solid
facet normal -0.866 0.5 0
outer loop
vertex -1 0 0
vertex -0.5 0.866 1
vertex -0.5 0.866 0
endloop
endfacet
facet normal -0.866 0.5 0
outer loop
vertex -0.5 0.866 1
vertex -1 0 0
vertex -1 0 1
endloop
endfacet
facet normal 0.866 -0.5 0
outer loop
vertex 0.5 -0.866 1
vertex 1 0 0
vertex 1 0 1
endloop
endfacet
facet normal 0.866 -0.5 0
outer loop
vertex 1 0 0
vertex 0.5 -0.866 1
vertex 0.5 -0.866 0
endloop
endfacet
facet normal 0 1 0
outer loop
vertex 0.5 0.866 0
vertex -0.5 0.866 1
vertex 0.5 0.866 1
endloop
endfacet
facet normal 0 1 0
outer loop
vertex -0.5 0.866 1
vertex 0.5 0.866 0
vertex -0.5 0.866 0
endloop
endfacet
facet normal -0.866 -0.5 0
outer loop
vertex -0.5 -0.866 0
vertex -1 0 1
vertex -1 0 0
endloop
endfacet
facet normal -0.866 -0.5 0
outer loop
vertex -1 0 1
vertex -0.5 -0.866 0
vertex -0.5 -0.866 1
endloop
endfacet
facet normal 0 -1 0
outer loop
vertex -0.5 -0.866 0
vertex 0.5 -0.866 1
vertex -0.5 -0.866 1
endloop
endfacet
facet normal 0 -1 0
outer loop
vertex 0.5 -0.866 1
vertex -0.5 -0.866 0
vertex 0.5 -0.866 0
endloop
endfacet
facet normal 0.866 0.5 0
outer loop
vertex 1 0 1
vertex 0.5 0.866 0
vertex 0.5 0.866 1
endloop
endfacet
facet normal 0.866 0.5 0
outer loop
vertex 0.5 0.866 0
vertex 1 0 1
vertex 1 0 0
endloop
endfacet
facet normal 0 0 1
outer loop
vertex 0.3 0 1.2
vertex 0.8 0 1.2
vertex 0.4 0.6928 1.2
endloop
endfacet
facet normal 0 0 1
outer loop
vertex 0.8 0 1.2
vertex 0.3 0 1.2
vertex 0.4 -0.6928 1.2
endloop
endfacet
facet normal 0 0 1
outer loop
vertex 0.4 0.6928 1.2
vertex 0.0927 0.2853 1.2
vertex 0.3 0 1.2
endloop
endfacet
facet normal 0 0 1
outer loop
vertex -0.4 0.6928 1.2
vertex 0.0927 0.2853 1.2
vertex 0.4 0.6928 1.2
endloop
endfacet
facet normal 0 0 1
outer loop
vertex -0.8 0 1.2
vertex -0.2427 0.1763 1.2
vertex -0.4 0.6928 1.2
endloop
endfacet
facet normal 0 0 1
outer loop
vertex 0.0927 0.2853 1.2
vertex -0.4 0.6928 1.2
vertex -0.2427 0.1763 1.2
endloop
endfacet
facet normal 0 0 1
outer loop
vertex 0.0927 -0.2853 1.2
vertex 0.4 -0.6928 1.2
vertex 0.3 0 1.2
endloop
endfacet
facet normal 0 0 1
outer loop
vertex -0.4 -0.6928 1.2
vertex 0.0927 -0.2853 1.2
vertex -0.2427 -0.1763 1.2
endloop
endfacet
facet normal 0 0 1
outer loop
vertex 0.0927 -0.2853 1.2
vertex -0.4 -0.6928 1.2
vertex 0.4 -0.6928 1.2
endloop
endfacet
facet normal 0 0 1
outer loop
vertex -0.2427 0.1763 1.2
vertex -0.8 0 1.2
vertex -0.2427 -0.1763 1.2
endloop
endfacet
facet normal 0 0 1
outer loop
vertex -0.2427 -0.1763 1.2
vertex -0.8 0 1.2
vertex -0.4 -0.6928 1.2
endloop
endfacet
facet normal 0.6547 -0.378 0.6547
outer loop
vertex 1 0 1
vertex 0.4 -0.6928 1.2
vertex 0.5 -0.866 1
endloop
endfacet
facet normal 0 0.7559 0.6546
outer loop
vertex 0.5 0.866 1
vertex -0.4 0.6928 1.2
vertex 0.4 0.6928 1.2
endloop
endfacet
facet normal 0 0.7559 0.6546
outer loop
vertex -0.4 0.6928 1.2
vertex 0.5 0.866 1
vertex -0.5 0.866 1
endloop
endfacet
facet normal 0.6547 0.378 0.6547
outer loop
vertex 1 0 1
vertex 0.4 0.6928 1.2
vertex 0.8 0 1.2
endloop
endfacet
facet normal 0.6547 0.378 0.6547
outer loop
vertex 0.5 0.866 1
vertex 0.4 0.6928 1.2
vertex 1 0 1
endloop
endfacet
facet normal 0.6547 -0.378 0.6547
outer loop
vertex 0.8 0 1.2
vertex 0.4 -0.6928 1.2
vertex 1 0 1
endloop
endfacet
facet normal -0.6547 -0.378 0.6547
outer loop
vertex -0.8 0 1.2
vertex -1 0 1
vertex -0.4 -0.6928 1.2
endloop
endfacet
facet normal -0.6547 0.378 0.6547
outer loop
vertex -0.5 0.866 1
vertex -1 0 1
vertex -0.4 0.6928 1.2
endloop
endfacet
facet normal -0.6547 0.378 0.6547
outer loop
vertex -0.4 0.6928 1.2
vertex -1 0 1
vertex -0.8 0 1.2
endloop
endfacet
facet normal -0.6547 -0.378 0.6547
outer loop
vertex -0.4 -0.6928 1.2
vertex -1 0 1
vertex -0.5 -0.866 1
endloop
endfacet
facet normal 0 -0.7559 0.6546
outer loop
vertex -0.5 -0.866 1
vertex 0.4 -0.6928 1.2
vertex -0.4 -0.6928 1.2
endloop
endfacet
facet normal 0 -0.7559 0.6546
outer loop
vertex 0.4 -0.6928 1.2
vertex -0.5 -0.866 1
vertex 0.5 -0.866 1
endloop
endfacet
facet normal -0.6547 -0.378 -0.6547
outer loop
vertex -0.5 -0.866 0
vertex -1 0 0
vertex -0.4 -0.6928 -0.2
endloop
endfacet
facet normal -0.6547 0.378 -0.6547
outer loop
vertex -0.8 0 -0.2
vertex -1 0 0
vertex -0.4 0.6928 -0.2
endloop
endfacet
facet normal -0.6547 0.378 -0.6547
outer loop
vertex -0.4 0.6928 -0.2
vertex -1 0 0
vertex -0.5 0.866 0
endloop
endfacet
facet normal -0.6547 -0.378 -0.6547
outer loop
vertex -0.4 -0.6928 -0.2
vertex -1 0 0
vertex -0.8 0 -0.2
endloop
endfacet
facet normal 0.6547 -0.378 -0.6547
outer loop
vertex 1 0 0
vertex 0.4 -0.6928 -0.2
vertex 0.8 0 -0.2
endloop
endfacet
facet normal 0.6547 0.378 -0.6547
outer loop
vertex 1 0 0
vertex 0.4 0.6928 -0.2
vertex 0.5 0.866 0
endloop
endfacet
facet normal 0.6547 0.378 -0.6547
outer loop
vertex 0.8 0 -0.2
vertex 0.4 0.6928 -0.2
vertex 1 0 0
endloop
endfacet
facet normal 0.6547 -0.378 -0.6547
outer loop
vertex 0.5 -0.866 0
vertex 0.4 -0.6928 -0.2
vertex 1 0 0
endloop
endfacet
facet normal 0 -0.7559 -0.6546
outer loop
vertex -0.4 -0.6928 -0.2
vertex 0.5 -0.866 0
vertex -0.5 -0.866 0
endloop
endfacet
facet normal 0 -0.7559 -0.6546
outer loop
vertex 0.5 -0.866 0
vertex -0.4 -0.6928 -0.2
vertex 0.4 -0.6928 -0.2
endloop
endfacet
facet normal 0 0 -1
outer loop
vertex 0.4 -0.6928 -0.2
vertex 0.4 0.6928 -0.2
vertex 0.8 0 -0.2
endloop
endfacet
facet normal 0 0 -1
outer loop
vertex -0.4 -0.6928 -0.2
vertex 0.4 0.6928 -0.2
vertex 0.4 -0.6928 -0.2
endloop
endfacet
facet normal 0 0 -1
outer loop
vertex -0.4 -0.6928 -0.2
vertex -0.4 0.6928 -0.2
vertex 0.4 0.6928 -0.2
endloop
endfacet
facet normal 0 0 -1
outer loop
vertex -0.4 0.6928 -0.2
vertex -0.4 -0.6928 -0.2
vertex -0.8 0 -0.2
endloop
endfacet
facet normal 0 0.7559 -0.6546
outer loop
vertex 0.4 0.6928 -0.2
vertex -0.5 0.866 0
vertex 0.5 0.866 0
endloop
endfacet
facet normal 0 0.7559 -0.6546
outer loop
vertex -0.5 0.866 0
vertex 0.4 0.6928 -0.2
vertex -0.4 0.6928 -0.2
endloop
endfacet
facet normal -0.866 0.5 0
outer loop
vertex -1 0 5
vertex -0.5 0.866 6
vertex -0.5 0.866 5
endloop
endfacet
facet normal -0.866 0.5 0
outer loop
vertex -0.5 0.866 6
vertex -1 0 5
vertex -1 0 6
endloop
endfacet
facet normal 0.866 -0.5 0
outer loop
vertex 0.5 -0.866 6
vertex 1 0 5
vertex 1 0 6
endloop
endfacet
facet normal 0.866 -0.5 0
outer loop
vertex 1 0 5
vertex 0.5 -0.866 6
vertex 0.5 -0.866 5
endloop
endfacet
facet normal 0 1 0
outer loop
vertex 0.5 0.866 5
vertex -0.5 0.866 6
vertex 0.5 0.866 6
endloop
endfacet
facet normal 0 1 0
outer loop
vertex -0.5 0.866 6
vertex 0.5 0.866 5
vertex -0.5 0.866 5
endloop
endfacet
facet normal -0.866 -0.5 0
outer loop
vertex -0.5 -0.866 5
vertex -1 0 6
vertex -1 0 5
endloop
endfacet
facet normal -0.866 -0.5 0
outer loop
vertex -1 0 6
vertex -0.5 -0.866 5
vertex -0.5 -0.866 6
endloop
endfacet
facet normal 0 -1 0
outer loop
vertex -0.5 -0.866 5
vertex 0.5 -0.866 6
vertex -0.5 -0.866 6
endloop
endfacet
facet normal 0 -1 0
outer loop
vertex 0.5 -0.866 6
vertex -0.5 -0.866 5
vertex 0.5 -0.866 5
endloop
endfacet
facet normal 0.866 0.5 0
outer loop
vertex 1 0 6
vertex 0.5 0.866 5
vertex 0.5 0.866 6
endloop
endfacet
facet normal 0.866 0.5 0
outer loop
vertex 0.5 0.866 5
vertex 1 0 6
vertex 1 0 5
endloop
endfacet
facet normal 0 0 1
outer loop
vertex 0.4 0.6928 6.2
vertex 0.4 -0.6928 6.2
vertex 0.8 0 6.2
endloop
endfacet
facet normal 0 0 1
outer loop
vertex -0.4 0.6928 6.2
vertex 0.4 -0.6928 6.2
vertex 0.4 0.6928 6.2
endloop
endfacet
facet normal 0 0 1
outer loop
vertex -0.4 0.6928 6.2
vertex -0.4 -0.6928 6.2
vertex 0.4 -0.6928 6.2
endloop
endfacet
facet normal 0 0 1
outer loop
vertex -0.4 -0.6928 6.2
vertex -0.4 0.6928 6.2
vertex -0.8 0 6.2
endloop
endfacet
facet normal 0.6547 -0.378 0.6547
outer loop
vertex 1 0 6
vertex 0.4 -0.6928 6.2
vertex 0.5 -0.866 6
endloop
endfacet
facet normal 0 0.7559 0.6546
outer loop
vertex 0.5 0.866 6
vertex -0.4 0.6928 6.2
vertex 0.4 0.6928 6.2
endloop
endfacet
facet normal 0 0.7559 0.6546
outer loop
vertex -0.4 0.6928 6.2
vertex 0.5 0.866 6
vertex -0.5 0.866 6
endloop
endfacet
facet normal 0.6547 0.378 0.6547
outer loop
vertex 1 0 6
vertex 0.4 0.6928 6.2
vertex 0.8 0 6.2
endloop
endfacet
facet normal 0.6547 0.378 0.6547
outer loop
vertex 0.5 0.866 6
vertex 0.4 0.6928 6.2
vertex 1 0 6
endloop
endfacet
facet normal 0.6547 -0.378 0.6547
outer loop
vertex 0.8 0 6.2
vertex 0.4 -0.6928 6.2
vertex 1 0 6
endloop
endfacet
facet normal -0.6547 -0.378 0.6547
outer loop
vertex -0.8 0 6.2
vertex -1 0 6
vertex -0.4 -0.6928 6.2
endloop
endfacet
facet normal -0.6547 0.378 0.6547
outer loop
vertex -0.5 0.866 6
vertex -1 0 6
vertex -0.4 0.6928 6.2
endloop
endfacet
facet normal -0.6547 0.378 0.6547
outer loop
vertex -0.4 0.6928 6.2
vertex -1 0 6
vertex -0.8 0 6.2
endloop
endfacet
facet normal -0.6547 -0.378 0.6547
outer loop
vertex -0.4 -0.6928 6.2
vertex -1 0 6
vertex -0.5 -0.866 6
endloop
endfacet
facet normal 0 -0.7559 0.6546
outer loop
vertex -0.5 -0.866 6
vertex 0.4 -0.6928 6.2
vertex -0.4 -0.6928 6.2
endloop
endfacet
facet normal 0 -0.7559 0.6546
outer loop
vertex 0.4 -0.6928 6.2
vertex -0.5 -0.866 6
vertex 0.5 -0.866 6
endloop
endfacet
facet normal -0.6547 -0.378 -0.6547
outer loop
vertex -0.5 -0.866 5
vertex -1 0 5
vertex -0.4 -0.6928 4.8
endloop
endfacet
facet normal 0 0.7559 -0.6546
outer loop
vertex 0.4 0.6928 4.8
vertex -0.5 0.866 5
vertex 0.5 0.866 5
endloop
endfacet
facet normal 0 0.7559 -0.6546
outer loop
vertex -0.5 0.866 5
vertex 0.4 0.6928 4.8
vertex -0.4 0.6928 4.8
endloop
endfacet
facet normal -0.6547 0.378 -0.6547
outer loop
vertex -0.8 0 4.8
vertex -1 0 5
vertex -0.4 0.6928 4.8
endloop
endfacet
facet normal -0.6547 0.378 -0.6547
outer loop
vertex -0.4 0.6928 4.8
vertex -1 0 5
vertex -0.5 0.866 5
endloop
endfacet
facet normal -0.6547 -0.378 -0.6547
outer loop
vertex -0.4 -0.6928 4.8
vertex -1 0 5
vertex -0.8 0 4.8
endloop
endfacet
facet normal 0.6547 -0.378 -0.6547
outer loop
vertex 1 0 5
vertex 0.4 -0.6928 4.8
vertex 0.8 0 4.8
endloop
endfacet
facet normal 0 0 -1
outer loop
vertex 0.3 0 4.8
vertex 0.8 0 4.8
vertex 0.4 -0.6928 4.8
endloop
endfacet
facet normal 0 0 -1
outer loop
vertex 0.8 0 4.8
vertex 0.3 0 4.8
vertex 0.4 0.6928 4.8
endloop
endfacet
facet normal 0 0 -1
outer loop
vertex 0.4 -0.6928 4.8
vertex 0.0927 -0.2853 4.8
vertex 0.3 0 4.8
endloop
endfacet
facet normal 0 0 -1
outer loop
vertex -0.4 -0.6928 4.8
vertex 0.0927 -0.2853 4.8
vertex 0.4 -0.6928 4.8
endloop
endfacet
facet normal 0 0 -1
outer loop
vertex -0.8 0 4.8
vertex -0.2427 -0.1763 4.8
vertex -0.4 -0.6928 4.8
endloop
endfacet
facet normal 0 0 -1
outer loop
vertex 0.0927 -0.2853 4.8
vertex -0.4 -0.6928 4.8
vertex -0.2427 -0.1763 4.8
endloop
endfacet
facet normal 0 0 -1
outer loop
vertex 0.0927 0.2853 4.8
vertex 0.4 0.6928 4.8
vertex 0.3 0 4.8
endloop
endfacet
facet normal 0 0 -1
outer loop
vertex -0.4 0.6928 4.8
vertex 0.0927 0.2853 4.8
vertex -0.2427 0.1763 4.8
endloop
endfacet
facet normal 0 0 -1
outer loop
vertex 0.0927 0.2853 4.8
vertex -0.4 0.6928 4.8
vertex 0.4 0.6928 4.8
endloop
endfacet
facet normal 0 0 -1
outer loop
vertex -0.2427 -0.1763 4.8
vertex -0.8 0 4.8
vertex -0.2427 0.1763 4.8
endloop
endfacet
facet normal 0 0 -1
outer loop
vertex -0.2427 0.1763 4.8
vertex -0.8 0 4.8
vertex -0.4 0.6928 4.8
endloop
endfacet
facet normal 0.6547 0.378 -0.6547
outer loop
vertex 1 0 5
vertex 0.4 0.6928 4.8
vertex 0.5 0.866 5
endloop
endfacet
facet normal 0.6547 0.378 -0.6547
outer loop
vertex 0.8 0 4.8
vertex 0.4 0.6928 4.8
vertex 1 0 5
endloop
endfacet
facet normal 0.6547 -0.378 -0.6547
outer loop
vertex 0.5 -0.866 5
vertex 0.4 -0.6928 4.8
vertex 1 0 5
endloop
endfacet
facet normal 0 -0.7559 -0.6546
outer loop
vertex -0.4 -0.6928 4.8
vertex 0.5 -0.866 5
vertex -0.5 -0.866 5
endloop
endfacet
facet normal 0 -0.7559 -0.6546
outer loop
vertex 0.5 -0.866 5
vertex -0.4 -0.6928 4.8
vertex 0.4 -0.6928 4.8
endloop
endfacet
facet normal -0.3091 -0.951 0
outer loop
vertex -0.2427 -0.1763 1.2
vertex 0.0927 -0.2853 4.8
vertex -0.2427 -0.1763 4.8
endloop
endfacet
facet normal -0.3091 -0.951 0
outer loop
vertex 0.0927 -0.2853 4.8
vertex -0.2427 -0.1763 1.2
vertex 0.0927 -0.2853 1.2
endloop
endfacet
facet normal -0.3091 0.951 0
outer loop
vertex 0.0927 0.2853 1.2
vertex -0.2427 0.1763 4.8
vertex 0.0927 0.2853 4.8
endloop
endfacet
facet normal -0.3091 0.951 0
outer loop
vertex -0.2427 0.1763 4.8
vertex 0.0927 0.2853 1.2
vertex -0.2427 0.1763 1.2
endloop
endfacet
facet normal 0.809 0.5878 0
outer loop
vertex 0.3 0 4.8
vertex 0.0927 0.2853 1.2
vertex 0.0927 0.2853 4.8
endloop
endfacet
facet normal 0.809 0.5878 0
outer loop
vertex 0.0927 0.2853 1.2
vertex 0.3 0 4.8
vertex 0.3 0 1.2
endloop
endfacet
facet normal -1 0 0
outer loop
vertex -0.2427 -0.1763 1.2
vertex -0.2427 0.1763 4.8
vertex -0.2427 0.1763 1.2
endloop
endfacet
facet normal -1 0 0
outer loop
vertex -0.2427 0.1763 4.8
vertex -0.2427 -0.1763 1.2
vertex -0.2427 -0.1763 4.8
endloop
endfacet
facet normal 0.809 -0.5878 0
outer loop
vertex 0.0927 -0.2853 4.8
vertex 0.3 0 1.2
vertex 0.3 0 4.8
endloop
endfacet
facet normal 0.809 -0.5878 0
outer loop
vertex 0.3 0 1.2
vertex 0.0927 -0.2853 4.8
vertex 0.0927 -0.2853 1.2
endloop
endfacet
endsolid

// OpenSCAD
module Weights_01(){

    module regular_polygon(order = 6, r=1){
         angles=[ for (i = [0:order-1]) i*(360/order) ];
         coords=[ for (th=angles) [r*cos(th), r*sin(th)] ];
         polygon(coords);
    }
     
     
    module weight(){ 
    color("#a8b0b2")
    linear_extrude(height= 1)
    regular_polygon(order = 6);
     
    translate([0,0,1])
    color("#a8b0b2")
    linear_extrude(height= 0.2, scale = 0.8)
    regular_polygon(order = 6);
     
    translate([0,0,0])
    rotate([0,180,0])
    color("#a8b0b2")
    linear_extrude(height= 0.2, scale = 0.8)
    regular_polygon(order = 6);
    }
     
     weight(); 
     translate([0,0,5])
     weight();
     
     color("#3b3b3b")
     cylinder(5,0.3,0.3);
 
}
 
Weights_01();

// Written by Nicolì Angelo (Gengio) 2024: 
// MIT License

//Permission is hereby granted, free of charge, to any person obtaining a copy of this software and associated documentation files (the "Software"), to deal in the Software without restriction, including without limitation the rights to use, copy, modify, merge, publish, distribute, sublicense, and/or sell copies of the Software, and to permit persons to whom the Software is furnished to do so, subject to the following conditions:

//The above copyright notice and this permission notice shall be included in all copies or substantial portions of the Software.

//THE SOFTWARE IS PROVIDED "AS IS", WITHOUT WARRANTY OF ANY KIND, EXPRESS OR IMPLIED, INCLUDING BUT NOT LIMITED TO THE WARRANTIES OF MERCHANTABILITY, FITNESS FOR A PARTICULAR PURPOSE AND NONINFRINGEMENT. IN NO EVENT SHALL THE AUTHORS OR COPYRIGHT HOLDERS BE LIABLE FOR ANY CLAIM, DAMAGES OR OTHER LIABILITY, WHETHER IN AN ACTION OF CONTRACT, TORT OR OTHERWISE, ARISING FROM, OUT OF OR IN CONNECTION WITH THE SOFTWARE OR THE USE OR OTHER DEALINGS IN THE SOFTWARE.
